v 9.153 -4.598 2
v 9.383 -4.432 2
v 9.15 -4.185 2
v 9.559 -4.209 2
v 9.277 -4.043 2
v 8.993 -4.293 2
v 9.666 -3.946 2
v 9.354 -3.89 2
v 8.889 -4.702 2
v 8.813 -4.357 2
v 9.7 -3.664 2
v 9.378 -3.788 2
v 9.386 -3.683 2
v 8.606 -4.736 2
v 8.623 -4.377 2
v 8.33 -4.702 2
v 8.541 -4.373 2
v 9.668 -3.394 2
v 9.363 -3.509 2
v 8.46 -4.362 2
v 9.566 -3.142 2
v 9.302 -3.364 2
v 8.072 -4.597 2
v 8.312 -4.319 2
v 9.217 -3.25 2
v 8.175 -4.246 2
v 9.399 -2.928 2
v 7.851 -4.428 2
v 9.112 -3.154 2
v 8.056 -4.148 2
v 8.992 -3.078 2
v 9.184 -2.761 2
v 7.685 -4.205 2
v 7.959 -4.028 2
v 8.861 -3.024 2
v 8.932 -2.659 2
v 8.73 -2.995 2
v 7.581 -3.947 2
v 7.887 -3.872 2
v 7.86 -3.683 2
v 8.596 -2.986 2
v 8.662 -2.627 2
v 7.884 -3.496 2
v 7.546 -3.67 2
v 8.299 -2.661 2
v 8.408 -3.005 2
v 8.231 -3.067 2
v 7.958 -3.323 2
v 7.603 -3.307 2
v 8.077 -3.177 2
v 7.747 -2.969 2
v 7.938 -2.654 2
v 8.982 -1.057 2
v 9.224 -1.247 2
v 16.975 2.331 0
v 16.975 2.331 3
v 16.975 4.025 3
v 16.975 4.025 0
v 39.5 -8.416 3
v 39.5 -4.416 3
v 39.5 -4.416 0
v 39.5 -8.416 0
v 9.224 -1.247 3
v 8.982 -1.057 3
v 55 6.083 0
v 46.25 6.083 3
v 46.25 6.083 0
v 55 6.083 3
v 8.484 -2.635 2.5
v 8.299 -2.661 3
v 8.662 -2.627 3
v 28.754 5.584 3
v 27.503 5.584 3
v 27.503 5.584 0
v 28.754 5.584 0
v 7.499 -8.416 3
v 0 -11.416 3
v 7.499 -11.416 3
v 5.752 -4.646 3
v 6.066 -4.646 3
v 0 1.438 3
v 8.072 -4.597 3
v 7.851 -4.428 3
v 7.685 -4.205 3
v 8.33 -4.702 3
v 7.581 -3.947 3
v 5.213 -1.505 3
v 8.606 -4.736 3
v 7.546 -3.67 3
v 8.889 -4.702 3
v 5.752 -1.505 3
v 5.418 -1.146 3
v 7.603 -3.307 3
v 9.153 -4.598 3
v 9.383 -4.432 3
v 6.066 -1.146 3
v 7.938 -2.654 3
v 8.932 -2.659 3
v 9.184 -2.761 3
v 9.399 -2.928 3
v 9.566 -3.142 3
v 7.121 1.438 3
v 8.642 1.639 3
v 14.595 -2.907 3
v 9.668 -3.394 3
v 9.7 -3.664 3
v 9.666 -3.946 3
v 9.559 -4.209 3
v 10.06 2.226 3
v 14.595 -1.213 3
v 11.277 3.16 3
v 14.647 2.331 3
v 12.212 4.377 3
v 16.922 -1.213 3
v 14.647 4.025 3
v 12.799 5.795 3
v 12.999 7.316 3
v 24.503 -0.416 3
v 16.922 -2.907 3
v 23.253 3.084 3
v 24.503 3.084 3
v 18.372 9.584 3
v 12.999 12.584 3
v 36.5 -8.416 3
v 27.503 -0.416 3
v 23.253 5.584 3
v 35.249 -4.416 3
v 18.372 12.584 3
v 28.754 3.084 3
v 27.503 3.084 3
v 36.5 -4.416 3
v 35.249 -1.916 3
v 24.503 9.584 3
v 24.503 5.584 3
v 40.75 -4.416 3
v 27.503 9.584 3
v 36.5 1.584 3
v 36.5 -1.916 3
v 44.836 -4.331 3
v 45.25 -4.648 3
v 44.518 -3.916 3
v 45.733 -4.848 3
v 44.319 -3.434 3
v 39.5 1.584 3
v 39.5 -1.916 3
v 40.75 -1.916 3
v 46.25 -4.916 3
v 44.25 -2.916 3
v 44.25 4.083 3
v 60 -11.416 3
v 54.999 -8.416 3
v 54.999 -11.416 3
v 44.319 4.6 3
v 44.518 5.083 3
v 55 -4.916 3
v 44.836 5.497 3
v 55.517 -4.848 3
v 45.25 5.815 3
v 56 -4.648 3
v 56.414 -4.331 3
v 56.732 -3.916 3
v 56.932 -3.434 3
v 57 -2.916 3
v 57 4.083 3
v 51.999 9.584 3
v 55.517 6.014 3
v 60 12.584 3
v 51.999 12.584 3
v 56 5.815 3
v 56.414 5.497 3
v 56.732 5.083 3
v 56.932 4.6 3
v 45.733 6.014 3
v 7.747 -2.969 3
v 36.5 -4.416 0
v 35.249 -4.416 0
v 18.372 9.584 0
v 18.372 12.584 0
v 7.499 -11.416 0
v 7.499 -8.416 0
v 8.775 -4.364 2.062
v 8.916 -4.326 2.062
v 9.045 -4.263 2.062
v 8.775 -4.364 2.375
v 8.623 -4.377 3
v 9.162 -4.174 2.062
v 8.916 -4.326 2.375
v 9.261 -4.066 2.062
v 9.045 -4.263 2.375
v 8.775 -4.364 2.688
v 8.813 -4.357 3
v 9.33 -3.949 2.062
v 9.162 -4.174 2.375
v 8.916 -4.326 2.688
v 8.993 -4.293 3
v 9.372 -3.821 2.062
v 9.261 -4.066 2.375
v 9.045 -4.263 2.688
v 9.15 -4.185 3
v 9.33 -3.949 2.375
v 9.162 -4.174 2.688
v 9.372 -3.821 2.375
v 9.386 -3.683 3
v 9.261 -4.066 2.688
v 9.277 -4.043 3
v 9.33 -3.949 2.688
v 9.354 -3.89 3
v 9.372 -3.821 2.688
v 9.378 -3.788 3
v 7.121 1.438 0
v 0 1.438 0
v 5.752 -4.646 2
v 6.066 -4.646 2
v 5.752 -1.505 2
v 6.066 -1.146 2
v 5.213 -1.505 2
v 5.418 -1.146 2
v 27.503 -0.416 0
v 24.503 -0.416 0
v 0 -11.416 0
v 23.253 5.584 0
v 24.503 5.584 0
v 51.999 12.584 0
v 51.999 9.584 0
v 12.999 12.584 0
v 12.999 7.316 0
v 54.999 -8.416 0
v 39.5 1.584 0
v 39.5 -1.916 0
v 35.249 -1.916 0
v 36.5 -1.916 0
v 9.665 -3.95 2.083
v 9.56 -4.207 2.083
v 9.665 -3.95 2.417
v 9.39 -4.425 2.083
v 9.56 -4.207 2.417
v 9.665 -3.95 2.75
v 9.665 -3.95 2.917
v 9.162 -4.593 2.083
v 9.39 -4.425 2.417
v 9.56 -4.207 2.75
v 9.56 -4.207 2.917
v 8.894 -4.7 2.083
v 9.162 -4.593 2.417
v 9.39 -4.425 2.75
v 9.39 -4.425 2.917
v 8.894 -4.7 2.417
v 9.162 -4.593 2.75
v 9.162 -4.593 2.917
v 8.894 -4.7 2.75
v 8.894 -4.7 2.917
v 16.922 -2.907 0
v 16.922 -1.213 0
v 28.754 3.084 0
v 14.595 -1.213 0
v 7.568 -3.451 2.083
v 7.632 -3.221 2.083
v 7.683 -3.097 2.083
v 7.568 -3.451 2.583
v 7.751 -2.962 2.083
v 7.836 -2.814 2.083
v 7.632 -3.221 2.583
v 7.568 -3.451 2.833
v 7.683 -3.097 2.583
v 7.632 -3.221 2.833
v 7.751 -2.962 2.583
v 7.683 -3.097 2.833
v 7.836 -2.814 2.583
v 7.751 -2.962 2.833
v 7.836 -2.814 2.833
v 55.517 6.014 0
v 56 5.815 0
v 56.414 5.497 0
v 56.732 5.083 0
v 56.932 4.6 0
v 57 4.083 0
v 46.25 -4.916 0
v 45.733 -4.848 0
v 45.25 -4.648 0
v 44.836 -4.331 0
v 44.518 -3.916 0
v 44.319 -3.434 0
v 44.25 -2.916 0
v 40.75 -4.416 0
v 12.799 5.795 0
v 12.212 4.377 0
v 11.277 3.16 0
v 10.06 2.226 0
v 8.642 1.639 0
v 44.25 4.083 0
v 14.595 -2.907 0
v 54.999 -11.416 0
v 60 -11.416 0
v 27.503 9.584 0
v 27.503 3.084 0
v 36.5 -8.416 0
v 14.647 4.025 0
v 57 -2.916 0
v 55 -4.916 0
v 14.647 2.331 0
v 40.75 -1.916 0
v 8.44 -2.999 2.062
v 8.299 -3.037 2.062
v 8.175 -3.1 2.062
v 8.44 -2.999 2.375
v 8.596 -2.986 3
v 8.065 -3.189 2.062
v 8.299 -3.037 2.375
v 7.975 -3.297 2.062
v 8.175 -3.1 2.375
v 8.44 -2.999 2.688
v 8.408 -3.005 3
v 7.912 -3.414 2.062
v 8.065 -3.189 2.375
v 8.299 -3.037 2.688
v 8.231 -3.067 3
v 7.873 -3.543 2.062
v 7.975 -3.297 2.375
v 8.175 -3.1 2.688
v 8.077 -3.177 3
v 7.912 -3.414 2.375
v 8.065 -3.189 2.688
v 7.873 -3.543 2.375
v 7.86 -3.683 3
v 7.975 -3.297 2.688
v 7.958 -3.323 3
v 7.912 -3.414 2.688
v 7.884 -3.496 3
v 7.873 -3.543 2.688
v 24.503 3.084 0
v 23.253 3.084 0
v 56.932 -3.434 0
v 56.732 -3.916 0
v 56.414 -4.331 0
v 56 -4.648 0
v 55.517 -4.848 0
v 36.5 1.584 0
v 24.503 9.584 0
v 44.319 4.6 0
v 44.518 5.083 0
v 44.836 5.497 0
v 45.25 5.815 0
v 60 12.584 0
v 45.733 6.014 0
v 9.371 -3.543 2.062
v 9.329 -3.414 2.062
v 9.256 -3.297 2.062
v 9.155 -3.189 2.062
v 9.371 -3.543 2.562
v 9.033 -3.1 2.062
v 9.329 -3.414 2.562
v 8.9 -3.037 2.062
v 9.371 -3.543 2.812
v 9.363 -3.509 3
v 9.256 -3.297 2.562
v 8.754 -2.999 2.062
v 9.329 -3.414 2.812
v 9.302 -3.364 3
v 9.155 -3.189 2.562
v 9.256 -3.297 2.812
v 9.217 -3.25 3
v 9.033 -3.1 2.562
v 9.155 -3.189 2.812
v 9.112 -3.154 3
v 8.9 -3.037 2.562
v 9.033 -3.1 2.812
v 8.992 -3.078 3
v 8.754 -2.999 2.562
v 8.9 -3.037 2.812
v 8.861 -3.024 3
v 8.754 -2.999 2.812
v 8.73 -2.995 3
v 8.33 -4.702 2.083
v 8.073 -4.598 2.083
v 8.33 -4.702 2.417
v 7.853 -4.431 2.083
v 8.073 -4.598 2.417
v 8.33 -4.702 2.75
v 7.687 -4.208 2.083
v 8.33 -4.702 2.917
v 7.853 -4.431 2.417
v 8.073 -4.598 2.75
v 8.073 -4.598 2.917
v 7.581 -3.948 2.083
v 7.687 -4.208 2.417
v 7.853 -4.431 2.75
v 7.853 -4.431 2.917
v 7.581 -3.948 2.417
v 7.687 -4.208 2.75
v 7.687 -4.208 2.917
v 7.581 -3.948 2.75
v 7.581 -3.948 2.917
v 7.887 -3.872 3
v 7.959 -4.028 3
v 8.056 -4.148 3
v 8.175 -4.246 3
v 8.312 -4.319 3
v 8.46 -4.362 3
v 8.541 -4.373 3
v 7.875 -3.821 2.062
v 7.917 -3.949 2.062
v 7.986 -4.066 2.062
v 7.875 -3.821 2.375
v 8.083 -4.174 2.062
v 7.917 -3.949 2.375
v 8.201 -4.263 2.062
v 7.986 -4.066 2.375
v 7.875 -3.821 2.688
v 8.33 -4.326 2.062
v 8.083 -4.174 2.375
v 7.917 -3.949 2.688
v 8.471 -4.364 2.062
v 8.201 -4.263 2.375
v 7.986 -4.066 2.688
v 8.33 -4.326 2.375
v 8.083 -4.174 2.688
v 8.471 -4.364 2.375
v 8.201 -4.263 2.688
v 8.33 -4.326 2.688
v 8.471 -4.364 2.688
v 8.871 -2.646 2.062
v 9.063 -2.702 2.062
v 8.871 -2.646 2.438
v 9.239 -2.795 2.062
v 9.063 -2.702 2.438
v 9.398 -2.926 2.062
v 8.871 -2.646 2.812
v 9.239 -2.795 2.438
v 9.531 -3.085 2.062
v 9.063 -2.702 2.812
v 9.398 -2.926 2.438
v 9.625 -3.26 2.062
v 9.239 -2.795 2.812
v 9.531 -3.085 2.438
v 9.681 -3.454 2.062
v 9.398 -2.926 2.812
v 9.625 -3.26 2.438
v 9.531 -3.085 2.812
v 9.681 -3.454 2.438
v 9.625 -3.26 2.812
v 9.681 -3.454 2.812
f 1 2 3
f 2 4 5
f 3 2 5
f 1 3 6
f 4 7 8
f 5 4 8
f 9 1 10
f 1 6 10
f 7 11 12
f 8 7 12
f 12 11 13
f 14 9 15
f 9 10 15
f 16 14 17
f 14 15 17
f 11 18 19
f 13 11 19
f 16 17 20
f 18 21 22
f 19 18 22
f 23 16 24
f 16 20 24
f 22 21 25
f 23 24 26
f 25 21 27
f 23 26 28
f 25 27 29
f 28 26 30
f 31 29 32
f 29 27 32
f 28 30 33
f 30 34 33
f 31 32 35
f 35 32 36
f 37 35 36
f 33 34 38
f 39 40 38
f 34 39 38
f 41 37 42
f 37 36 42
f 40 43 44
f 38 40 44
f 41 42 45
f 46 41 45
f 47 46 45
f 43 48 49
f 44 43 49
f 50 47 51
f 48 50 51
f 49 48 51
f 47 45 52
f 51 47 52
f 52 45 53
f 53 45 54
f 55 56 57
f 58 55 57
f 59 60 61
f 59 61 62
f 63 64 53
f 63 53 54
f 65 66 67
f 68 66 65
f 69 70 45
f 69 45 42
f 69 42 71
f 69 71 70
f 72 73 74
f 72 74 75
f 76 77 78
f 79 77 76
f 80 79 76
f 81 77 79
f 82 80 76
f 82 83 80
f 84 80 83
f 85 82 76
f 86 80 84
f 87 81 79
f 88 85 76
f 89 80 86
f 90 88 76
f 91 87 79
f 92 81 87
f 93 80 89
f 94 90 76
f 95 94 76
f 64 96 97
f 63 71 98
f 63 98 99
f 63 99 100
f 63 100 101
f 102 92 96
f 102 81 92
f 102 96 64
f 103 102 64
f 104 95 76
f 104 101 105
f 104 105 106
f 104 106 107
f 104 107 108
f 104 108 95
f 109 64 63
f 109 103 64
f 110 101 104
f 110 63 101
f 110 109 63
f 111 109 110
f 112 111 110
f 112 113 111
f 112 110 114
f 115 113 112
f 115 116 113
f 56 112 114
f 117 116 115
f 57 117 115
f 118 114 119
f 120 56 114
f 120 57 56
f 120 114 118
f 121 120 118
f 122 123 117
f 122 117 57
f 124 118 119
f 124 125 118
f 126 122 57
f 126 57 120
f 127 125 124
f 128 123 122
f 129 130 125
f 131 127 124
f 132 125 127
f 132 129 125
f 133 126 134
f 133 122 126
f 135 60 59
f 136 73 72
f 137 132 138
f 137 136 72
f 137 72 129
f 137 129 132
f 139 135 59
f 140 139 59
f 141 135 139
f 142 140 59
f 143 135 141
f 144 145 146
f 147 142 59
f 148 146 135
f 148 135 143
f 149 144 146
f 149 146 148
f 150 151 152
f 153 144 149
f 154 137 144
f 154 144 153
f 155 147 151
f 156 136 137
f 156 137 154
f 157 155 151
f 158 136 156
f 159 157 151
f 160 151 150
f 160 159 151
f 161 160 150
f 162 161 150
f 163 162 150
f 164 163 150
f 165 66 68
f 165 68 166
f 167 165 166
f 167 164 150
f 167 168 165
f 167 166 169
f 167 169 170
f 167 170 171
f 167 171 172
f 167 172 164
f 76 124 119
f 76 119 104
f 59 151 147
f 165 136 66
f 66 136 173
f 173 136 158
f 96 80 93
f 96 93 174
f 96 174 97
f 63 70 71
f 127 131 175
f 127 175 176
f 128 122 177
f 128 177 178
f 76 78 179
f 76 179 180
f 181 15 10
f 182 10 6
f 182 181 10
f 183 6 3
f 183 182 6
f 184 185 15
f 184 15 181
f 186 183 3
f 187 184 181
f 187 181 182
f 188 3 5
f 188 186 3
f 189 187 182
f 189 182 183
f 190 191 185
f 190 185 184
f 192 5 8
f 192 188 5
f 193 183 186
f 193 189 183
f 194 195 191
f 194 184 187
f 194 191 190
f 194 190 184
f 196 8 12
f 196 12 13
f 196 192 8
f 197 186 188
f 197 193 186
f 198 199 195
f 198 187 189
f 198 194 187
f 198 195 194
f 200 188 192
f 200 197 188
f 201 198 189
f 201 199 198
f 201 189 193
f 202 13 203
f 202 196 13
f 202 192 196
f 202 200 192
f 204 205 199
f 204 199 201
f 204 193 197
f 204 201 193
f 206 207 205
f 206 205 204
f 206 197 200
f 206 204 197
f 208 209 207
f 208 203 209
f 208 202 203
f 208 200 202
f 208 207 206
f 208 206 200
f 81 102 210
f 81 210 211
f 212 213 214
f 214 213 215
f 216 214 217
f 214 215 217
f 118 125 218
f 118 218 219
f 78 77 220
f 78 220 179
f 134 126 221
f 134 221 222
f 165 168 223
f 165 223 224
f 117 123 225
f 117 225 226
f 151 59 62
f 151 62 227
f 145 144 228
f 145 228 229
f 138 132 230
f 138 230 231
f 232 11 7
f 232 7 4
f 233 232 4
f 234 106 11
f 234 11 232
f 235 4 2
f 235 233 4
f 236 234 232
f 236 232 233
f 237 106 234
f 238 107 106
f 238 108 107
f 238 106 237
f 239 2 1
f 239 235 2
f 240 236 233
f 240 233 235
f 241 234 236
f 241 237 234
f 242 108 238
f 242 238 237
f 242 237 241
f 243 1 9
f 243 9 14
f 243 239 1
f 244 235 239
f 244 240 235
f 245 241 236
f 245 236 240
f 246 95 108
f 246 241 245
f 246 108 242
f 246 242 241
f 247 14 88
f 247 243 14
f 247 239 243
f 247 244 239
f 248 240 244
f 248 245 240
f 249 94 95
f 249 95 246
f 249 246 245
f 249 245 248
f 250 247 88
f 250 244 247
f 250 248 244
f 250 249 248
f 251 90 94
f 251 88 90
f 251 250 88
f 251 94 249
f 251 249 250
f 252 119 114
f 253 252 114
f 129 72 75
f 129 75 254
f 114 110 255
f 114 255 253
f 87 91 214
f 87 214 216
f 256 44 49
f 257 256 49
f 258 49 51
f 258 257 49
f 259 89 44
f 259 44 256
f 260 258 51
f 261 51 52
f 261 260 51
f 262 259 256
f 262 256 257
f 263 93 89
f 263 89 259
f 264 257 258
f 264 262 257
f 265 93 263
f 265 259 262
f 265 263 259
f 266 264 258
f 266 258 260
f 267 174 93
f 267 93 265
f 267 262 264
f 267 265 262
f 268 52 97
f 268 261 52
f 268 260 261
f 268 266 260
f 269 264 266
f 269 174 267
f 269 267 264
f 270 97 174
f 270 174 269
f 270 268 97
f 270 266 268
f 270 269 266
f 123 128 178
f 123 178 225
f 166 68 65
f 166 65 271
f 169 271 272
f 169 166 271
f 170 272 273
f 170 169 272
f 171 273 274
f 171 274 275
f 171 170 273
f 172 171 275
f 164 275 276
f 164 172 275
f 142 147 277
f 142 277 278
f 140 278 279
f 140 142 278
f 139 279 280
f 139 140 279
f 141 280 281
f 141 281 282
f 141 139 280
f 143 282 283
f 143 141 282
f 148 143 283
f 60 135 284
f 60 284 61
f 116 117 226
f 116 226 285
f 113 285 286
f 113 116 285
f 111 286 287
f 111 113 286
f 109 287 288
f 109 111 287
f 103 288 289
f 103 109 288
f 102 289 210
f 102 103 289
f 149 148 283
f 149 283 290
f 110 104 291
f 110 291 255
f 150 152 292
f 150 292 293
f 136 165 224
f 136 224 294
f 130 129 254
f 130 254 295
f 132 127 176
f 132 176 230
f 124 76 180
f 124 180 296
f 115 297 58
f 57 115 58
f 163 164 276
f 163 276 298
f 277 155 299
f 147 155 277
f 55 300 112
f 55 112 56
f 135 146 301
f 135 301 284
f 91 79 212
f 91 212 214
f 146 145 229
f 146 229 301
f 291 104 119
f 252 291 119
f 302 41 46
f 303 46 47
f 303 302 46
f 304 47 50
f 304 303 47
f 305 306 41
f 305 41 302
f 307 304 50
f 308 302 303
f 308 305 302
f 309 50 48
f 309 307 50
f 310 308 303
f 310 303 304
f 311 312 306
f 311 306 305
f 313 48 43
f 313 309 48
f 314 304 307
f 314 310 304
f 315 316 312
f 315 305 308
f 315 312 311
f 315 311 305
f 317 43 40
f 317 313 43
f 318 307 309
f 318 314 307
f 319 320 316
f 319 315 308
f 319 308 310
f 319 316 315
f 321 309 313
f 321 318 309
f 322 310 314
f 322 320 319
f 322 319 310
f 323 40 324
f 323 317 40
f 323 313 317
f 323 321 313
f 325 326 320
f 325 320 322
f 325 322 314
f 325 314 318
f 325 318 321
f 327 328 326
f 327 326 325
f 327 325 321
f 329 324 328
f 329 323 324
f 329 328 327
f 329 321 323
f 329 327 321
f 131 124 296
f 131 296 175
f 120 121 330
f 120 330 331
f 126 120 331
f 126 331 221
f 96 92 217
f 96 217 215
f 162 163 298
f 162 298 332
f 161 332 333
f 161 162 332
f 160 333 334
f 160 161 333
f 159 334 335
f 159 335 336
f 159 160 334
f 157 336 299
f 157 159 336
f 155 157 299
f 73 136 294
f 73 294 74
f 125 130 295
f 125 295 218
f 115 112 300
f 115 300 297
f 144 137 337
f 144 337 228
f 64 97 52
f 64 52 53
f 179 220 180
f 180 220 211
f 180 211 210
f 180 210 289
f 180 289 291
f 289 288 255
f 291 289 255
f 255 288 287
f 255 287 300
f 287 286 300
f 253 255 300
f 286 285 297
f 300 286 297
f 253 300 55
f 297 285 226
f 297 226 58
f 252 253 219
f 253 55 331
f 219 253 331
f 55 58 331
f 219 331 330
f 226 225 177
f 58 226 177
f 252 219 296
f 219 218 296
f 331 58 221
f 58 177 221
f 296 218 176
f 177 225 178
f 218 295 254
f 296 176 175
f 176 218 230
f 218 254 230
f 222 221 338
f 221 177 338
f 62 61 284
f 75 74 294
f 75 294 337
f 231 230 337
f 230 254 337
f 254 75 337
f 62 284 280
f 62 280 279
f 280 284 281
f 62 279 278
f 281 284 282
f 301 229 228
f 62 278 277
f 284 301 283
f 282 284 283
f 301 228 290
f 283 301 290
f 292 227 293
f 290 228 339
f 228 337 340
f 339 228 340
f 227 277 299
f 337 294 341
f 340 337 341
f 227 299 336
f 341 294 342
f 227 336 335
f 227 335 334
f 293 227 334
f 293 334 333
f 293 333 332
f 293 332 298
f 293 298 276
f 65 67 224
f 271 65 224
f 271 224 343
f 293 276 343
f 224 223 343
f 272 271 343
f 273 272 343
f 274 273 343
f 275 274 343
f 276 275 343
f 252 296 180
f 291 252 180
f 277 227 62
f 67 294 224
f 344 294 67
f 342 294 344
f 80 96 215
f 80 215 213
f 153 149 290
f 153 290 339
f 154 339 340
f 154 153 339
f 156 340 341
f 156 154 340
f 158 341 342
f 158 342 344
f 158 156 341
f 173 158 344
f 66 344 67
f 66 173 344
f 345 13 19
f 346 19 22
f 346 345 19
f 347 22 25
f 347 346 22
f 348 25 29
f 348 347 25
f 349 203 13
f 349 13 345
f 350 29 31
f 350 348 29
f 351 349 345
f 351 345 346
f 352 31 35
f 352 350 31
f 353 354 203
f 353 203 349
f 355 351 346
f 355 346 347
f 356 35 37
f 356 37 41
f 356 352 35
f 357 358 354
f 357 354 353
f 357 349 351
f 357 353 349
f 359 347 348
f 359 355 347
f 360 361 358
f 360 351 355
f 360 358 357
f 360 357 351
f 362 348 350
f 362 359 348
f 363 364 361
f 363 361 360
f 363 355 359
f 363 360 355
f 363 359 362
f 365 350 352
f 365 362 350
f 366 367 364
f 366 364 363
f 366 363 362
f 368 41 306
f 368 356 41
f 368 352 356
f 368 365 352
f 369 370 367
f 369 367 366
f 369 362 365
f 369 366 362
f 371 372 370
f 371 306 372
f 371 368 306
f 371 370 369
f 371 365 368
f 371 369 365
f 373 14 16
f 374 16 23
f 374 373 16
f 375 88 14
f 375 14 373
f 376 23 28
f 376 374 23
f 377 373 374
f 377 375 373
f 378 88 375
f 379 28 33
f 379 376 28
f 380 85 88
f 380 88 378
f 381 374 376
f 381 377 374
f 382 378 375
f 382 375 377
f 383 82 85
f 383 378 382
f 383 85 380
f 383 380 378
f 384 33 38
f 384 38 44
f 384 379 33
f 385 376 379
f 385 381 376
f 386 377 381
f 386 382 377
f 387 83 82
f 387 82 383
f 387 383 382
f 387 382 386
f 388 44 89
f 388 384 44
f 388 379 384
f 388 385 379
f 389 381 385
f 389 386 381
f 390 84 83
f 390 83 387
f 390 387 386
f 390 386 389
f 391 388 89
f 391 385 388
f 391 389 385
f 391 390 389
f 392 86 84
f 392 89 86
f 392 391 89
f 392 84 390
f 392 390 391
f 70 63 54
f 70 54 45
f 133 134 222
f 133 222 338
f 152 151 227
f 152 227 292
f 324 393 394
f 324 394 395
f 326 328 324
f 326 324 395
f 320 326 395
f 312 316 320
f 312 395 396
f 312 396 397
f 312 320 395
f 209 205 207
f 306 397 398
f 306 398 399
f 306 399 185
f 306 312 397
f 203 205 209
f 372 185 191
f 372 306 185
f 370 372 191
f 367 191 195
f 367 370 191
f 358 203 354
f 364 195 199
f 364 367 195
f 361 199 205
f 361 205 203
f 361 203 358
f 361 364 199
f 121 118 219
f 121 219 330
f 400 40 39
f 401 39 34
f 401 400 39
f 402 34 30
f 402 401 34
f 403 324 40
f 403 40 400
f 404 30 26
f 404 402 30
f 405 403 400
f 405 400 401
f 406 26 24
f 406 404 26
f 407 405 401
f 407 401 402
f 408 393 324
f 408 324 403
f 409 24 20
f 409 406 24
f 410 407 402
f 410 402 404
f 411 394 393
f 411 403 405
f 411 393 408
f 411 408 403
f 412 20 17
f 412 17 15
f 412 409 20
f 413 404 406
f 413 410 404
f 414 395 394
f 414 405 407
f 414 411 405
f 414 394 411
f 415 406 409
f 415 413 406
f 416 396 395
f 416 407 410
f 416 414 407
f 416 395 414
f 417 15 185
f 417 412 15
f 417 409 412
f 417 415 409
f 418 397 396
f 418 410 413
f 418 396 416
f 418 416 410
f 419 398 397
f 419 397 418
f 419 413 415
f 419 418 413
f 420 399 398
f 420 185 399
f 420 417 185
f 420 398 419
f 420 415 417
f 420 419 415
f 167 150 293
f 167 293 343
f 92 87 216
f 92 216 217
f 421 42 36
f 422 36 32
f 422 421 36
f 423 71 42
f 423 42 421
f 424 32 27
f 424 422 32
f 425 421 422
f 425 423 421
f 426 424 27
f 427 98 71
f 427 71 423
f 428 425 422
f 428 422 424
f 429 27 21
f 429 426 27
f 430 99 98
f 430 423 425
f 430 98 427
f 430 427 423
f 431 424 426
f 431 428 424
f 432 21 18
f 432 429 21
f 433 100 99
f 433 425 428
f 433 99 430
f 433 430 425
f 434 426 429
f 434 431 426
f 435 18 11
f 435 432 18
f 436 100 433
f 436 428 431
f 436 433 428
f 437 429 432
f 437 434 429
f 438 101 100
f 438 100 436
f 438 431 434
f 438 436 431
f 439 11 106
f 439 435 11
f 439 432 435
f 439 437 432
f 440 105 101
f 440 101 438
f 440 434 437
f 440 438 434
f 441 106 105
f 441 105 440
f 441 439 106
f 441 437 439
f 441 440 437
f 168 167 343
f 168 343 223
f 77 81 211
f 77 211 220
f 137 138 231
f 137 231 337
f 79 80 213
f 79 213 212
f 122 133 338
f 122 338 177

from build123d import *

# Parameters (mm, degrees)
SKETCH_1_W          = 2.3276
SKETCH_1_H          = 1.694
EXTRUDE_1_DEPTH     = 3
CUT_EXTRUDE_1_DEPTH = 1


with BuildPart() as part:
    # 草图1 → 凸台-拉伸1 (new body)
    with BuildSketch(Plane.XY.offset(3)):
        with BuildLine():
            Line((23.2531, 5.583631793), (24.503, 5.583631793))
            Line((24.503, 5.583631793), (24.503, 9.583631793))
            Line((24.503, 9.583631793), (18.3721, 9.583631793))
            Line((18.3721, 9.583631793), (18.3721, 12.583631793))
            Line((18.3721, 12.583631793), (12.9991, 12.583631793))
            Line((12.9991, 12.583631793), (12.9991, 7.316491962))
            ThreePointArc((12.9991, 7.316491962), (11.277392164, 3.159921553), (7.120821755, 1.438213717))
            Line((7.120821755, 1.438213717), (0, 1.438213717))
            Line((0, 1.438213717), (0, -11.416368207))
            Line((0, -11.416368207), (7.4994, -11.416368207))
            Line((7.4994, -11.416368207), (7.4994, -8.416368207))
            Line((7.4994, -8.416368207), (36.5002, -8.416368207))
            Line((36.5002, -8.416368207), (36.5002, -4.416368207))
            Line((36.5002, -4.416368207), (35.2489, -4.416368207))
            Line((35.2489, -4.416368207), (35.2489, -1.916368207))
            Line((35.2489, -1.916368207), (36.5002, -1.916368207))
            Line((36.5002, -1.916368207), (36.5002, 1.583631793))
            Line((36.5002, 1.583631793), (39.5003, 1.583631793))
            Line((39.5003, 1.583631793), (39.5003, -1.916368207))
            Line((39.5003, -1.916368207), (40.7501, -1.916368207))
            Line((40.7501, -1.916368207), (40.7501, -4.416368207))
            Line((40.7501, -4.416368207), (39.5003, -4.416368207))
            Line((39.5003, -4.416368207), (39.5003, -8.416368207))
            Line((39.5003, -8.416368207), (54.9988, -8.416368207))
            Line((54.9988, -8.416368207), (54.9988, -11.416368207))
            Line((54.9988, -11.416368207), (59.9998, -11.416368207))
            Line((59.9998, -11.416368207), (59.9998, 12.583631793))
            Line((59.9998, 12.583631793), (51.9988, 12.583631793))
            Line((51.9988, 12.583631793), (51.9988, 9.583631793))
            Line((51.9988, 9.583631793), (27.5031, 9.583631793))
            Line((27.5031, 9.583631793), (27.5031, 5.583631793))
            Line((27.5031, 5.583631793), (28.7543, 5.583631793))
            Line((28.7543, 5.583631793), (28.7543, 3.083631793))
            Line((28.7543, 3.083631793), (27.5031, 3.083631793))
            Line((27.5031, 3.083631793), (27.5031, -0.416368207))
            Line((27.5031, -0.416368207), (24.503, -0.416368207))
            Line((24.503, -0.416368207), (24.503, 3.083631793))
            Line((24.503, 3.083631793), (23.2531, 3.083631793))
            Line((23.2531, 3.083631793), (23.2531, 5.583631793))
        make_face()
        with BuildLine():
            Line((46.2504, 6.082631793), (54.9998, 6.082631793))
            ThreePointArc((54.9998, 6.082631793), (56.414013562, 5.496845355), (56.9998, 4.082631793))
            Line((56.9998, 4.082631793), (56.9998, -2.916368207))
            ThreePointArc((56.9998, -2.916368207), (56.414013562, -4.330581769), (54.9998, -4.916368207))
            Line((54.9998, -4.916368207), (46.2504, -4.916368207))
            ThreePointArc((46.2504, -4.916368207), (44.836186438, -4.330581769), (44.2504, -2.916368207))
            Line((44.2504, -2.916368207), (44.2504, 4.082631793))
            ThreePointArc((44.2504, 4.082631793), (44.836186438, 5.496845355), (46.2504, 6.082631793))
        make_face(mode=Mode.SUBTRACT)
        with Locations((15.811, 3.177631793)):
            Rectangle(SKETCH_1_W, SKETCH_1_H, mode=Mode.SUBTRACT)
        with Locations((15.7586, -2.060368207)):
            Rectangle(SKETCH_1_W, SKETCH_1_H, mode=Mode.SUBTRACT)
    extrude(amount=-EXTRUDE_1_DEPTH)

    # 草图2 → 切除-拉伸1 (cut)
    # profile 1 of 2: a face of its own
    with BuildSketch(Plane.XY.offset(3)):
        Polygon((5.418488838, -1.146310398), (6.065624255, -1.146310398), (6.065624255, -4.646310398), (5.75152169, -4.646310398), (5.75152169, -1.505284757), (5.213060152, -1.505284757), align=None)
    # profile 2 of 2: a face of its own
    with BuildSketch(Plane.XY.offset(3)):
        with BuildLine():
            Line((8.982290921, -1.056566809), (9.22417794, -1.246570815))
            Line((9.22417794, -1.246570815), (8.299398293, -2.660733475))
            add(Edge.make_bspline(
                [(8.299398293, -2.660733475), (8.36096857, -2.650919615), (8.481068357, -2.63177657), (8.602634255, -2.628618624), (8.661878261, -2.627079629)],
                knots=[0, 0, 0, 0, 1.025318673, 2, 2, 2, 2], degree=3))
            add(Edge.make_bspline(
                [(8.661878261, -2.627079629), (8.697450757, -2.628035741), (8.767474158, -2.629917818), (8.87028096, -2.644401669), (8.969069896, -2.667226781), (9.063431508, -2.700499037), (9.15370449, -2.743001391), (9.240406886, -2.793940261), (9.321908896, -2.855945942), (9.399260075, -2.925210897), (9.469487173, -3.001927882), (9.531663228, -3.083329219), (9.58389002, -3.1693301), (9.626263942, -3.259886966), (9.65916882, -3.354860225), (9.683156465, -3.454128365), (9.697336058, -3.557759836), (9.699261549, -3.628238011), (9.700239639, -3.664038764)],
                knots=[0, 0, 0, 0, 1.04369286, 2.054478336, 3.041073146, 4.015093852, 4.984733326, 5.965804835, 6.960378782, 7.985147595, 9.009457201, 10.008161701, 10.986880575, 11.956520048, 12.937015923, 13.931873656, 14.949455224, 16, 16, 16, 16], degree=3))
            add(Edge.make_bspline(
                [(9.700239639, -3.664038764), (9.698816534, -3.713018468), (9.696016201, -3.809398934), (9.668112405, -3.94977564), (9.62475276, -4.083508155), (9.562775231, -4.208461327), (9.485792849, -4.324463896), (9.391915256, -4.427249362), (9.284471767, -4.518919399), (9.162984969, -4.595576018), (9.032242005, -4.658179069), (8.894890008, -4.703144311), (8.752262861, -4.730827781), (8.655458253, -4.734298384), (8.606489639, -4.736053988)],
                knots=[0, 0, 0, 0, 1.031375318, 2.029502543, 3.004789286, 3.987476834, 4.960371455, 5.9300674, 6.912260825, 7.929083631, 8.949397511, 9.960523116, 10.96833055, 12, 12, 12, 12], degree=3))
            add(Edge.make_bspline(
                [(8.606489639, -4.736053988), (8.559392939, -4.734525782), (8.466102621, -4.731498674), (8.328869826, -4.704532736), (8.197006809, -4.660825634), (8.071437428, -4.600611355), (7.955116815, -4.524553472), (7.851051179, -4.432991193), (7.759759404, -4.327881728), (7.683784783, -4.209241381), (7.623526051, -4.081751423), (7.578336126, -3.948814267), (7.551939883, -3.810914285), (7.548251326, -3.717433146), (7.546393485, -3.67034886)],
                knots=[0, 0, 0, 0, 1.012016664, 2.004627821, 2.994792927, 3.992885782, 4.990978636, 5.973936114, 6.964471063, 7.975201453, 8.993600317, 9.990122807, 10.98767138, 12, 12, 12, 12], degree=3))
            add(Edge.make_bspline(
                [(7.546393485, -3.67034886), (7.54757493, -3.634304277), (7.549987215, -3.560708125), (7.566830606, -3.449244097), (7.5938954, -3.335193015), (7.624205647, -3.238438821), (7.656231257, -3.159177299), (7.682883796, -3.095273809), (7.716057792, -3.029512736), (7.751431174, -2.9596391), (7.792188043, -2.887453667), (7.836503692, -2.811749997), (7.885603343, -2.73373207), (7.920023506, -2.680787874), (7.937619447, -2.653722257)],
                knots=[0, 0, 0, 0, 1.173818275, 2.396712641, 3.66331629, 4.989737886, 5.693666774, 6.447286557, 7.243889047, 8.091586357, 8.998013824, 9.943181721, 10.948533338, 12, 12, 12, 12], degree=3))
            Line((7.937619447, -2.653722257), (8.982290921, -1.056566809))
        make_face()
        with BuildLine():
            add(Edge.make_bspline(
                [(8.595972812, -2.986053988), (8.569310567, -2.986832032), (8.517231458, -2.988351777), (8.440824043, -2.997177029), (8.368510792, -3.013796095), (8.299333658, -3.034962426), (8.234585955, -3.064065486), (8.173797115, -3.099417285), (8.116732064, -3.141038463), (8.063988512, -3.188339374), (8.016168848, -3.240127407), (7.974987718, -3.29559693), (7.939465318, -3.353411133), (7.910583499, -3.414053075), (7.888093423, -3.477499574), (7.871825172, -3.543458824), (7.862771421, -3.61237313), (7.861265189, -3.659105633), (7.860496049, -3.682969052)],
                knots=[0, 0, 0, 0, 1.129588631, 2.206414736, 3.251139165, 4.268635594, 5.265702196, 6.250456724, 7.242448911, 8.251968645, 9.246821453, 10.222880186, 11.173611482, 12.116736599, 13.062300278, 14.020270554, 14.989073742, 16, 16, 16, 16], degree=3))
            add(Edge.make_bspline(
                [(7.860496049, -3.682969052), (7.861122411, -3.706619032), (7.862350613, -3.752993122), (7.873502932, -3.821332301), (7.890538015, -3.88709721), (7.915878411, -3.949948808), (7.946105299, -4.010845127), (7.986010623, -4.067580412), (8.030227409, -4.123600482), (8.083081342, -4.174601954), (8.139804705, -4.222058578), (8.200405908, -4.263538831), (8.263565868, -4.299025005), (8.33013729, -4.326836102), (8.399175674, -4.349660389), (8.471256228, -4.365721868), (8.546429083, -4.374802394), (8.597351021, -4.376310588), (8.623316562, -4.377079629)],
                knots=[0, 0, 0, 0, 0.989467248, 1.94019797, 2.891935182, 3.827694429, 4.772920941, 5.730924762, 6.725747692, 7.756678648, 8.79901574, 9.819492441, 10.826891316, 11.826466727, 12.835195252, 13.867842842, 14.912794438, 16, 16, 16, 16], degree=3))
            add(Edge.make_bspline(
                [(8.623316562, -4.377079629), (8.649282061, -4.376310528), (8.700203915, -4.374802216), (8.775377376, -4.365722547), (8.847455694, -4.349657899), (8.916502203, -4.326845129), (8.983043634, -4.298991519), (9.046148355, -4.263759599), (9.106176449, -4.221803482), (9.162937048, -4.174683053), (9.215570987, -4.123310201), (9.260848266, -4.068080479), (9.299531499, -4.010386584), (9.330965686, -3.950188694), (9.356026977, -3.887059206), (9.373148445, -3.821342482), (9.384277733, -3.752990456), (9.3855091, -3.706618132), (9.386137075, -3.682969052)],
                knots=[0, 0, 0, 0, 1.087397944, 2.132534446, 3.165364764, 4.174271784, 5.174024072, 6.181601208, 7.194203697, 8.236725232, 9.267838612, 10.269026844, 11.221737037, 12.171628256, 13.107553087, 14.05945871, 15.010357665, 16, 16, 16, 16], degree=3))
            add(Edge.make_bspline(
                [(9.386137075, -3.682969052), (9.385586782, -3.659074501), (9.384506736, -3.612177269), (9.372290787, -3.54348965), (9.355348413, -3.477164444), (9.329765383, -3.413618495), (9.296528838, -3.353102568), (9.256045431, -3.295310967), (9.209212861, -3.23980062), (9.155115321, -3.188237811), (9.096225087, -3.141090733), (9.033609502, -3.099471177), (8.968101528, -3.0643462), (8.899767586, -3.035039098), (8.827824703, -3.013889624), (8.753434364, -2.997236381), (8.675645121, -2.988374363), (8.622868513, -2.986837298), (8.595972812, -2.986053988)],
                knots=[0, 0, 0, 0, 0.978206639, 1.919901502, 2.851605144, 3.780102724, 4.718870031, 5.675451981, 6.667674623, 7.690630536, 8.733308323, 9.756129687, 10.767539656, 11.776269907, 12.797430371, 13.836405707, 14.897401972, 16, 16, 16, 16], degree=3))
        make_face(mode=Mode.SUBTRACT)
    extrude(amount=-CUT_EXTRUDE_1_DEPTH, mode=Mode.SUBTRACT)


solid = part.part
